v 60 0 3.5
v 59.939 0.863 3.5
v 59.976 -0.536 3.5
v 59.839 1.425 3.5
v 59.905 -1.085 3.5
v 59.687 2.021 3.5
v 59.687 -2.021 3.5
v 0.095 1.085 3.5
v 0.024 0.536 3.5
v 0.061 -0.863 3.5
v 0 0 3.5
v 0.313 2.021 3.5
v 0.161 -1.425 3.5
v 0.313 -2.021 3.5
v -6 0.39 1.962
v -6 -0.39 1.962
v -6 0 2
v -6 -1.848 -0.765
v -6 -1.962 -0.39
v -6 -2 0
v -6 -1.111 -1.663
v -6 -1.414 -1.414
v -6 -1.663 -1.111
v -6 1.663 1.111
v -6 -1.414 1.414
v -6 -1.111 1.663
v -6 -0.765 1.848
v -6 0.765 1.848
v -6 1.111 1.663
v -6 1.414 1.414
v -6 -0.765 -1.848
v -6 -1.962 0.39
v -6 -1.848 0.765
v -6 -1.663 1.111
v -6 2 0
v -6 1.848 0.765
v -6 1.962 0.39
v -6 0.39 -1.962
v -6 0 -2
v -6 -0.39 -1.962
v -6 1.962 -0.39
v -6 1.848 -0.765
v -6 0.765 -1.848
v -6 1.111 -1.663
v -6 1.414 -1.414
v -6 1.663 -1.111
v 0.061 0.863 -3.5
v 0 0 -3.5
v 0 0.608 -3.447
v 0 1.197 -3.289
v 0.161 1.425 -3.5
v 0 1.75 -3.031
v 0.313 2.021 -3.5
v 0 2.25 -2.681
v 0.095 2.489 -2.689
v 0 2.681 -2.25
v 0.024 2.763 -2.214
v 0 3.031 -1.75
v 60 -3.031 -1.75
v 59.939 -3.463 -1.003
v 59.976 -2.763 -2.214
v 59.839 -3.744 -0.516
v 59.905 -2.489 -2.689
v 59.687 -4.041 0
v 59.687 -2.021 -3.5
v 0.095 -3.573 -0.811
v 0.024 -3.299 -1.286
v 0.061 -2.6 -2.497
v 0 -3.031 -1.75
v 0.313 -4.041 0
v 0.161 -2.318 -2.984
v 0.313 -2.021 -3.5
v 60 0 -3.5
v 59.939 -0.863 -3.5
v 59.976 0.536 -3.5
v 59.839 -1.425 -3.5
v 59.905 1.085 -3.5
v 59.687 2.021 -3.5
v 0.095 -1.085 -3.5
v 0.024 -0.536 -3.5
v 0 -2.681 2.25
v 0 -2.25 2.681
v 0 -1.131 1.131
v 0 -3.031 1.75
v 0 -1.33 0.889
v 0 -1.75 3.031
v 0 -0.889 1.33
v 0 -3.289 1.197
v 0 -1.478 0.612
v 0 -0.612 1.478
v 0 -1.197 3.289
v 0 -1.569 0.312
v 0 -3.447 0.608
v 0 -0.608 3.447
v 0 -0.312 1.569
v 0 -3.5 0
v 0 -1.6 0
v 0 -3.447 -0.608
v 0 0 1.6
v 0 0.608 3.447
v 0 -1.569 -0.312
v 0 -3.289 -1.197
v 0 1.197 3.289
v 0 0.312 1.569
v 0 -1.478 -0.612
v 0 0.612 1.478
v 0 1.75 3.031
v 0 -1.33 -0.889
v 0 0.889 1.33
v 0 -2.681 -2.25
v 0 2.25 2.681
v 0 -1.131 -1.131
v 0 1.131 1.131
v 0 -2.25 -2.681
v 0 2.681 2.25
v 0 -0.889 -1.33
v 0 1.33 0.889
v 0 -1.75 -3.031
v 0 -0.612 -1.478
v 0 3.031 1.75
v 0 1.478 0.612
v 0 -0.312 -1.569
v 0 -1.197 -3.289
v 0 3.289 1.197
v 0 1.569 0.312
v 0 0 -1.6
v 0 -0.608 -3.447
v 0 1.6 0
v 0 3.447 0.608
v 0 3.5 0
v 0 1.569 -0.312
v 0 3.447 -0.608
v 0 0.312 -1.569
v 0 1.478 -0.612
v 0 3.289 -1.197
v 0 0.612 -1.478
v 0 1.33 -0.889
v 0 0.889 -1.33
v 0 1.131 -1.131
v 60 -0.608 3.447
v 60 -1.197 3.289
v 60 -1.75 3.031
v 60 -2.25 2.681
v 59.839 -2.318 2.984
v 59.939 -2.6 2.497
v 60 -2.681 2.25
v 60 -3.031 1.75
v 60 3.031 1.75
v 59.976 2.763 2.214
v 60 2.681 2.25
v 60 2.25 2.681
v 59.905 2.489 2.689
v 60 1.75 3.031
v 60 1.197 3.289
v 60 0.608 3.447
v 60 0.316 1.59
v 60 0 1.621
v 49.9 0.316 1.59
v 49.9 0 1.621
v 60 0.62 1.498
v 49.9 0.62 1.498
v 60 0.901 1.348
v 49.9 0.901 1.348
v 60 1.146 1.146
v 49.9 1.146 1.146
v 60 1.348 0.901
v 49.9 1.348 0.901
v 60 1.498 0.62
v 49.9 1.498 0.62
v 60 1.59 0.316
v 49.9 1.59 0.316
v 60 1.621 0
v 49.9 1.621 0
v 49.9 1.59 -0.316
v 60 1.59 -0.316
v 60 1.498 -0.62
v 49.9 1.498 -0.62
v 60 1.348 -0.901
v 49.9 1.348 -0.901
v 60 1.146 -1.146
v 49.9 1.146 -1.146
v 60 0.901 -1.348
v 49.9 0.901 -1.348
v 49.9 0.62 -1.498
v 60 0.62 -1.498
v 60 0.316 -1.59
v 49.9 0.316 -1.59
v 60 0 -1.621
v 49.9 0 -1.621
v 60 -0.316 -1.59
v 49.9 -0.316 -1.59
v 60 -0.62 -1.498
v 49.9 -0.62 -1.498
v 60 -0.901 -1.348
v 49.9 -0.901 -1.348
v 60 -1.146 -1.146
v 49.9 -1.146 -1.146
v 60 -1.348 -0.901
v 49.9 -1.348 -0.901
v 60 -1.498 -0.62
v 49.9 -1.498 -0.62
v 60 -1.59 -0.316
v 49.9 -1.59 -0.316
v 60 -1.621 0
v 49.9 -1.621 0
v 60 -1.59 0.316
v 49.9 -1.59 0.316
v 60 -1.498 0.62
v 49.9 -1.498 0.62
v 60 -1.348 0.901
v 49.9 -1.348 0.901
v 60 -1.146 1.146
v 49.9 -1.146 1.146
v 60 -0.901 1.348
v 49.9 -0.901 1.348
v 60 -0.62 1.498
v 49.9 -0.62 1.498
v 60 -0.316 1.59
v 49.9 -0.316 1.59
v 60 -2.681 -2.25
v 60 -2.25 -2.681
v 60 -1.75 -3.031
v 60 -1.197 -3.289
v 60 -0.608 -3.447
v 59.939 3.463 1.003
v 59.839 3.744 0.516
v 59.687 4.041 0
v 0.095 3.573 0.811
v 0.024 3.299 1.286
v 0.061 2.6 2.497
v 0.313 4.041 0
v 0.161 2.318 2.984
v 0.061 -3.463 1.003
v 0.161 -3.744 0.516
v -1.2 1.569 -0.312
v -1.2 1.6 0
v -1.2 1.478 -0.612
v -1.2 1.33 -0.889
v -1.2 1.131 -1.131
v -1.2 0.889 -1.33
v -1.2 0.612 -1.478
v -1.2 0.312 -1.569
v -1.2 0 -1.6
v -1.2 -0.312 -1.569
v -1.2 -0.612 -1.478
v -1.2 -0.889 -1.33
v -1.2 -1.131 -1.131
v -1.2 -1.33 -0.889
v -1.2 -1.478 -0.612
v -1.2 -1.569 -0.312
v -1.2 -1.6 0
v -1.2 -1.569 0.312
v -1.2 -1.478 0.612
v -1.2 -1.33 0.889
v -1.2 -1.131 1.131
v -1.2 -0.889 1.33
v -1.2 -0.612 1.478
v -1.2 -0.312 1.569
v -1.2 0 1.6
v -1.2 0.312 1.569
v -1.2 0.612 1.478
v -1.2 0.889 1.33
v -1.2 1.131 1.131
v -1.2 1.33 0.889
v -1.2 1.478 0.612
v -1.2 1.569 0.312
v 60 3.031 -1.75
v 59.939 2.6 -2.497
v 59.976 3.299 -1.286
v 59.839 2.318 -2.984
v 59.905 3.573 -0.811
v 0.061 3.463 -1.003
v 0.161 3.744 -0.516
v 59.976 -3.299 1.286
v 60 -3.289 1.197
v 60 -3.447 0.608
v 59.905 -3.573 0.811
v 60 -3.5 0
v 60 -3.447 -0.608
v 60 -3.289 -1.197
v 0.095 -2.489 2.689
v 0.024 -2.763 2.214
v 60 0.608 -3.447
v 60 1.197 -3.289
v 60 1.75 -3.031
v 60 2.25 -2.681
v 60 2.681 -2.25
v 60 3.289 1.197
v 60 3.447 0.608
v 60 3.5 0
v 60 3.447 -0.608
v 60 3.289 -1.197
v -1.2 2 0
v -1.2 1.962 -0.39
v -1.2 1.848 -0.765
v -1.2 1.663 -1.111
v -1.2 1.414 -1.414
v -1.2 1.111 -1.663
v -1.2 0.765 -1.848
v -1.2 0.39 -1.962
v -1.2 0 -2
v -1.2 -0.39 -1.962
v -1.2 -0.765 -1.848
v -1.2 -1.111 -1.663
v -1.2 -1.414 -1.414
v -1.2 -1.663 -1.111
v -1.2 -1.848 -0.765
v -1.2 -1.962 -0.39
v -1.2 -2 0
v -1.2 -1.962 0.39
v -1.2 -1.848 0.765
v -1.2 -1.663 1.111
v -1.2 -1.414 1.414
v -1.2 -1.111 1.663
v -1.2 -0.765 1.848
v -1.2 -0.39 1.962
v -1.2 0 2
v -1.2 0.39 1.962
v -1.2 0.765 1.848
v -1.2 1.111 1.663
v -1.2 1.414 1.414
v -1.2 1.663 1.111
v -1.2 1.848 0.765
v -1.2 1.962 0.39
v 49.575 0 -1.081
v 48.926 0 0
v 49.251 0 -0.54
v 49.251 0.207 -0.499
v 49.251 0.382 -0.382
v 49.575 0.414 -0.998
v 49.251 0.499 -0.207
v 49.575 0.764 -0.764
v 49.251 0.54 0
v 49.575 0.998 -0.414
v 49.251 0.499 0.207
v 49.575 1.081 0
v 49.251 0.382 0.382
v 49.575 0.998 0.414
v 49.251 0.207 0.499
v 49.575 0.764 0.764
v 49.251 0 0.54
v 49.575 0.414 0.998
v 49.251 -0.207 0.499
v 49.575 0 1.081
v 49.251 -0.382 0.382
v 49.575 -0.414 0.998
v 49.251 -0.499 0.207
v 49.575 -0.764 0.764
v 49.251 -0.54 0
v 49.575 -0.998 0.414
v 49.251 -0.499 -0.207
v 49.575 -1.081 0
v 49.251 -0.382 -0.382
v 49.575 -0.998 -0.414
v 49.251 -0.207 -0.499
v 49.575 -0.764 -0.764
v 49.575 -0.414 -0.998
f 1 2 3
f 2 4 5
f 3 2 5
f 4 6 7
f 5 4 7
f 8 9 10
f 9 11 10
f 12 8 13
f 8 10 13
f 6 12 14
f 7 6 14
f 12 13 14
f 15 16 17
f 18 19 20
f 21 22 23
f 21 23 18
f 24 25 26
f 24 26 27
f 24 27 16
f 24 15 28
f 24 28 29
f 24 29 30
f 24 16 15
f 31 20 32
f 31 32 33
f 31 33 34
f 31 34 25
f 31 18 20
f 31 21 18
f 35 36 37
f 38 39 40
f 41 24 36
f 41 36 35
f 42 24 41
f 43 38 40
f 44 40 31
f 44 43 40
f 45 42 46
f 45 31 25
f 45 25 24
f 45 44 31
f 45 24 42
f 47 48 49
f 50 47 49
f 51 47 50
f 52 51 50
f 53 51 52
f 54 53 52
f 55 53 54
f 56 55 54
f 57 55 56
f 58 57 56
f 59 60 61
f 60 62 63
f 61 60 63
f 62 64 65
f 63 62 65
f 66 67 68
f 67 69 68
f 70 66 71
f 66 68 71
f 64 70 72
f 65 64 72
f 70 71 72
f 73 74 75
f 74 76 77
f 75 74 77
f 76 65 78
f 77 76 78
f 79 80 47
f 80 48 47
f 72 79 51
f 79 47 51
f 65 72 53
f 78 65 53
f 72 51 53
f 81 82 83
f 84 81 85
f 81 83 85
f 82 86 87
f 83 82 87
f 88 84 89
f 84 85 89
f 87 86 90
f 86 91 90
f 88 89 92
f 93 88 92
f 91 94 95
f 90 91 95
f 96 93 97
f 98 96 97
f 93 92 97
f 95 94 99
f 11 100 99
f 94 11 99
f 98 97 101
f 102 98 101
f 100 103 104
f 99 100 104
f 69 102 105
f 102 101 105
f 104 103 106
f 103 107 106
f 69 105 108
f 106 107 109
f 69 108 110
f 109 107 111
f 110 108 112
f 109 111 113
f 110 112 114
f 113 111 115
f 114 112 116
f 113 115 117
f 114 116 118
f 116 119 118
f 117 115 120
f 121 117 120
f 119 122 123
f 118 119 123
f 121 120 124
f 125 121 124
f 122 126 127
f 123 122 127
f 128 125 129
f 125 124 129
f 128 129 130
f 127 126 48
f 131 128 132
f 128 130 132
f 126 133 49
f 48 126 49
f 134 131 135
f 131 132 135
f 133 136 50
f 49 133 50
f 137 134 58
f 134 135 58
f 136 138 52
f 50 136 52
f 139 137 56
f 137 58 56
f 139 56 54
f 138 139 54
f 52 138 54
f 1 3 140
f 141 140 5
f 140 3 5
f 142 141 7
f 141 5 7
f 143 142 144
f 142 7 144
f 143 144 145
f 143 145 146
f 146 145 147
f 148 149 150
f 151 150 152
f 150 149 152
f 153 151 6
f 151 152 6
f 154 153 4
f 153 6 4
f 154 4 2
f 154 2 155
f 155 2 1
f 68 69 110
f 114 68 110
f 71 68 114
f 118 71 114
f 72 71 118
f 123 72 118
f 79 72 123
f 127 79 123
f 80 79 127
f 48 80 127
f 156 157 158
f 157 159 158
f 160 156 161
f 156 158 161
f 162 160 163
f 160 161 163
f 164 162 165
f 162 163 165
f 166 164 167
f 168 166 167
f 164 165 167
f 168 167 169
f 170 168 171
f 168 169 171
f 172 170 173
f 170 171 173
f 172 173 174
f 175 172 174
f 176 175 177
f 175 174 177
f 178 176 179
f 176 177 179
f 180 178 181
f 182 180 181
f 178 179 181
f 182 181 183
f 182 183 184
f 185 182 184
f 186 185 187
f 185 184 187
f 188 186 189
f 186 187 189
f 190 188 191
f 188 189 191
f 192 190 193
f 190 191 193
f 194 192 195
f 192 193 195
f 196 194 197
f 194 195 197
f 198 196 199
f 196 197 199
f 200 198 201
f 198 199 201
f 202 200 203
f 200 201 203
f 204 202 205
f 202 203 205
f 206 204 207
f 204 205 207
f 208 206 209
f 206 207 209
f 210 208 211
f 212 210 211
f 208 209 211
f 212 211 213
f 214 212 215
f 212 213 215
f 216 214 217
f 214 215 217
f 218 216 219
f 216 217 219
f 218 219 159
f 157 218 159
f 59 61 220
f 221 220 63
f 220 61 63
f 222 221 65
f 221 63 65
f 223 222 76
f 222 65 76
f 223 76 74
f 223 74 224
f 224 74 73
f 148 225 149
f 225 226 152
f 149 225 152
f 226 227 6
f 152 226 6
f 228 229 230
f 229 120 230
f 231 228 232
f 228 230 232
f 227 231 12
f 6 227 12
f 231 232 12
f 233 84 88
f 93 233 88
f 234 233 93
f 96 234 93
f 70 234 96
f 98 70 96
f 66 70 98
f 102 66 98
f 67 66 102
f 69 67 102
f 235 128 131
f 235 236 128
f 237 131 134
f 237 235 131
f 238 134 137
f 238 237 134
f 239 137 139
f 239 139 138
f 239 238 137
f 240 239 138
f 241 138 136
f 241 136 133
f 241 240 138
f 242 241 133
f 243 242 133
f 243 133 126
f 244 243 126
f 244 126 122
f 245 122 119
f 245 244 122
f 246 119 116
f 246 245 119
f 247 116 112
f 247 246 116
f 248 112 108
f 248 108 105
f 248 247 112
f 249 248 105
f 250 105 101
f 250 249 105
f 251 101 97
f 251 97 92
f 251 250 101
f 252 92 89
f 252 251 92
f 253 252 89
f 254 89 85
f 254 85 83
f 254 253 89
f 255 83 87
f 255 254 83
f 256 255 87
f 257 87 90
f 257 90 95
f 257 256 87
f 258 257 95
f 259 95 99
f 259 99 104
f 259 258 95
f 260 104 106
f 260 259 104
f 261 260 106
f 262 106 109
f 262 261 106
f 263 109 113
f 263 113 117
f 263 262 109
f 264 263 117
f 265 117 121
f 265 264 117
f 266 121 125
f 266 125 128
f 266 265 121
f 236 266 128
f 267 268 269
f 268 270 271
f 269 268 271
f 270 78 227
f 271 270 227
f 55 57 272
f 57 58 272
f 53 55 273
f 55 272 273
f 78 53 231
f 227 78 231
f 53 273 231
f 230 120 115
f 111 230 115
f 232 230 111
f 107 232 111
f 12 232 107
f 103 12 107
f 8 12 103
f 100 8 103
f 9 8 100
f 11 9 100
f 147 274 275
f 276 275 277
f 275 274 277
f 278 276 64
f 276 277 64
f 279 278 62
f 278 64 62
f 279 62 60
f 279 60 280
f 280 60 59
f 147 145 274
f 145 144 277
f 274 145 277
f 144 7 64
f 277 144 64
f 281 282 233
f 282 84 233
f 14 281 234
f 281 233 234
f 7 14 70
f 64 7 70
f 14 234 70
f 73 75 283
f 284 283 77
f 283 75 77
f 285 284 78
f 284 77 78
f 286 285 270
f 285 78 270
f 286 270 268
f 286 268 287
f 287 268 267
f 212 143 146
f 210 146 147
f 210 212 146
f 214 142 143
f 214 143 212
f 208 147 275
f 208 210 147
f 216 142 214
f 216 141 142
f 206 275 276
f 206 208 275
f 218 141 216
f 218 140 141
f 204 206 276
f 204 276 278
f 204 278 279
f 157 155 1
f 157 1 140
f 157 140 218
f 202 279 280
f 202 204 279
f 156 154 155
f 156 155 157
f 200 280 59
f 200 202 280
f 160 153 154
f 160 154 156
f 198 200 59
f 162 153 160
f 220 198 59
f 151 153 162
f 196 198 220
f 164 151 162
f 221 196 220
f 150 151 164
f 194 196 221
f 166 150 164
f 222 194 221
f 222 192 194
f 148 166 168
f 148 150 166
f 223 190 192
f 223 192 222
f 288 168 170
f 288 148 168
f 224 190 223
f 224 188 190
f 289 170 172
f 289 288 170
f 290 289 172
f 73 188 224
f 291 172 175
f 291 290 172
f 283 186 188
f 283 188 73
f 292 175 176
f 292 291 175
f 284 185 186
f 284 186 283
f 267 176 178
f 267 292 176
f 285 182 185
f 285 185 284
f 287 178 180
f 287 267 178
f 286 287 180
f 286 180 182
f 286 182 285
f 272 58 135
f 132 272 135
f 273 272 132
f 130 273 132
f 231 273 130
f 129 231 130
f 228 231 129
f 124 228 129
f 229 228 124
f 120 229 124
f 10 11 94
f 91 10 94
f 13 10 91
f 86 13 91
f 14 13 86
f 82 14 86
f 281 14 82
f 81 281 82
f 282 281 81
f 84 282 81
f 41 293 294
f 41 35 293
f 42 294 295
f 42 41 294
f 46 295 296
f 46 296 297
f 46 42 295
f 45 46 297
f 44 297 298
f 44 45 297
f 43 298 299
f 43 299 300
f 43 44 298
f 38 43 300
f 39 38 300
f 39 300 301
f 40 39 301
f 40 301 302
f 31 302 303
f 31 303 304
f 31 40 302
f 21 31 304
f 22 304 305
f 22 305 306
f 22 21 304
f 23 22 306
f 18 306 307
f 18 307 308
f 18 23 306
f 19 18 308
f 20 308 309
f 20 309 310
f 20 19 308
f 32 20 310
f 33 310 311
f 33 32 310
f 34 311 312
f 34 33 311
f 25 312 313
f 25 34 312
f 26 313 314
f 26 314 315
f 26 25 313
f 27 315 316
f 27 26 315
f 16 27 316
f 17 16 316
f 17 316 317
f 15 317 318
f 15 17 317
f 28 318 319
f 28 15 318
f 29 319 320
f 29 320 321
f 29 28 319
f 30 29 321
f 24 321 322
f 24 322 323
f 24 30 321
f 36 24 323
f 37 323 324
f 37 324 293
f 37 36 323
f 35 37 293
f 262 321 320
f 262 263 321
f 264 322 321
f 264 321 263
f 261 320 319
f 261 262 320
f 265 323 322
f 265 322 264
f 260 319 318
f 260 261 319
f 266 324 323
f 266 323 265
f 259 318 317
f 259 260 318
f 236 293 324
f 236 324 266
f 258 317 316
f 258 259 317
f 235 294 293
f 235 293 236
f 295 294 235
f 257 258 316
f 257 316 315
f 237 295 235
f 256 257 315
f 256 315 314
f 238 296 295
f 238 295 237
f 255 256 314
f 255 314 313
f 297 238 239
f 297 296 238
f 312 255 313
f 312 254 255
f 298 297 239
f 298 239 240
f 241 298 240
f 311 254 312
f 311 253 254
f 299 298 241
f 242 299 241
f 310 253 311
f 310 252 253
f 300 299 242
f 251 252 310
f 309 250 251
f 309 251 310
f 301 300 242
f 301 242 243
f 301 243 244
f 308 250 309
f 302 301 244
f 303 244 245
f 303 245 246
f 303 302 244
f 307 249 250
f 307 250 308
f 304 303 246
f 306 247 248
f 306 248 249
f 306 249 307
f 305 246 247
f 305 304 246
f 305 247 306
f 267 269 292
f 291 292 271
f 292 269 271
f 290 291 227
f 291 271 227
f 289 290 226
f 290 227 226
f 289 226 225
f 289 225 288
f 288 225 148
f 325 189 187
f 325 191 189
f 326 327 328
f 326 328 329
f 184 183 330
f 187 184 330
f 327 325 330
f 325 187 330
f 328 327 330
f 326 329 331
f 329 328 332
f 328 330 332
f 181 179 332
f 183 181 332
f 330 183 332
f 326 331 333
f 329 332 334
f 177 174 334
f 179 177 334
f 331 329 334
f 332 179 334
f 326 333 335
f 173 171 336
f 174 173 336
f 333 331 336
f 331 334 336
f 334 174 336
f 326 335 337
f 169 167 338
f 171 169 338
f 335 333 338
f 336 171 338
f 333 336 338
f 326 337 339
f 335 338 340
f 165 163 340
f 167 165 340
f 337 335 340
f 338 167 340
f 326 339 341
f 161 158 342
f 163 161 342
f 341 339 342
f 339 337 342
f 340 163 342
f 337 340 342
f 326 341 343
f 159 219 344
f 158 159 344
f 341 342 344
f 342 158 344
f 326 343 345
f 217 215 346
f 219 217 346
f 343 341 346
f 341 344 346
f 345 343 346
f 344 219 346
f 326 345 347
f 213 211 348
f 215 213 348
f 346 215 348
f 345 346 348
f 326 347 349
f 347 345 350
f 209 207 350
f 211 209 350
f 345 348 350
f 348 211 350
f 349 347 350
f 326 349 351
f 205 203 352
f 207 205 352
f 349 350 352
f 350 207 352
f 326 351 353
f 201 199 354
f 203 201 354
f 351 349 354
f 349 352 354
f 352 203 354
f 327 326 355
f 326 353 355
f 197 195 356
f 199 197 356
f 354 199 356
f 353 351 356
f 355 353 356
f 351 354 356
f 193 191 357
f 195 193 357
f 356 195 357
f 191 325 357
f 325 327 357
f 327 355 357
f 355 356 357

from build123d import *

# Parameters (mm, degrees)
BOSS_EXTRUDE1_DEPTH = 60
TAP2_D              = 3.242
TAP2_DEPTH          = 10.1
TAP2_TIP            = 0.973995063


with BuildPart() as part:
    # Sketch1 → Boss-Extrude1 (new body)
    with BuildSketch(Plane(origin=(0, 0, 0), x_dir=(0, 0, -1), z_dir=(1, 0, 0))):
        Polygon((0, 4.041451884), (-3.5, 2.020725942), (-3.5, -2.020725942), (0, -4.041451884), (3.5, -2.020725942), (3.5, 2.020725942), align=None)
    extrude(amount=BOSS_EXTRUDE1_DEPTH)

    # Sketch2 → Cut-Revolve1 (revolve, cut)
    with BuildSketch(Plane.XY):
        Polygon((0, 4.041451884), (0, 3.5), (0.312607391, 4.041451884), align=None)
        Polygon((59.687392609, 4.041451884), (60, 4.041451884), (60, 3.5), align=None)
    revolve(axis=Axis((0, 0, 0), (1, 0, 0)), mode=Mode.SUBTRACT)

    # Sketch6 → Revolve2 (revolve)
    with BuildSketch(Plane.XY):
        Polygon((0, 0), (0, 1.6), (-1.2, 1.6), (-1.2, 2), (-6, 2), (-6, 0), align=None)
    revolve(axis=Axis((0, 0, 0), (-1, 0, 0)))

    # Tap2
    with Locations(Plane(origin=(60, 0, 0), x_dir=(0, 0, -1), z_dir=(1, 0, 0))):
        with Locations((0, 0)):
            Hole(TAP2_D / 2, depth=TAP2_DEPTH)
            with Locations((0, 0, -(TAP2_DEPTH + TAP2_TIP / 2))):  # 118° drill point
                Cone(0, TAP2_D / 2, TAP2_TIP, mode=Mode.SUBTRACT)


solid = part.part
